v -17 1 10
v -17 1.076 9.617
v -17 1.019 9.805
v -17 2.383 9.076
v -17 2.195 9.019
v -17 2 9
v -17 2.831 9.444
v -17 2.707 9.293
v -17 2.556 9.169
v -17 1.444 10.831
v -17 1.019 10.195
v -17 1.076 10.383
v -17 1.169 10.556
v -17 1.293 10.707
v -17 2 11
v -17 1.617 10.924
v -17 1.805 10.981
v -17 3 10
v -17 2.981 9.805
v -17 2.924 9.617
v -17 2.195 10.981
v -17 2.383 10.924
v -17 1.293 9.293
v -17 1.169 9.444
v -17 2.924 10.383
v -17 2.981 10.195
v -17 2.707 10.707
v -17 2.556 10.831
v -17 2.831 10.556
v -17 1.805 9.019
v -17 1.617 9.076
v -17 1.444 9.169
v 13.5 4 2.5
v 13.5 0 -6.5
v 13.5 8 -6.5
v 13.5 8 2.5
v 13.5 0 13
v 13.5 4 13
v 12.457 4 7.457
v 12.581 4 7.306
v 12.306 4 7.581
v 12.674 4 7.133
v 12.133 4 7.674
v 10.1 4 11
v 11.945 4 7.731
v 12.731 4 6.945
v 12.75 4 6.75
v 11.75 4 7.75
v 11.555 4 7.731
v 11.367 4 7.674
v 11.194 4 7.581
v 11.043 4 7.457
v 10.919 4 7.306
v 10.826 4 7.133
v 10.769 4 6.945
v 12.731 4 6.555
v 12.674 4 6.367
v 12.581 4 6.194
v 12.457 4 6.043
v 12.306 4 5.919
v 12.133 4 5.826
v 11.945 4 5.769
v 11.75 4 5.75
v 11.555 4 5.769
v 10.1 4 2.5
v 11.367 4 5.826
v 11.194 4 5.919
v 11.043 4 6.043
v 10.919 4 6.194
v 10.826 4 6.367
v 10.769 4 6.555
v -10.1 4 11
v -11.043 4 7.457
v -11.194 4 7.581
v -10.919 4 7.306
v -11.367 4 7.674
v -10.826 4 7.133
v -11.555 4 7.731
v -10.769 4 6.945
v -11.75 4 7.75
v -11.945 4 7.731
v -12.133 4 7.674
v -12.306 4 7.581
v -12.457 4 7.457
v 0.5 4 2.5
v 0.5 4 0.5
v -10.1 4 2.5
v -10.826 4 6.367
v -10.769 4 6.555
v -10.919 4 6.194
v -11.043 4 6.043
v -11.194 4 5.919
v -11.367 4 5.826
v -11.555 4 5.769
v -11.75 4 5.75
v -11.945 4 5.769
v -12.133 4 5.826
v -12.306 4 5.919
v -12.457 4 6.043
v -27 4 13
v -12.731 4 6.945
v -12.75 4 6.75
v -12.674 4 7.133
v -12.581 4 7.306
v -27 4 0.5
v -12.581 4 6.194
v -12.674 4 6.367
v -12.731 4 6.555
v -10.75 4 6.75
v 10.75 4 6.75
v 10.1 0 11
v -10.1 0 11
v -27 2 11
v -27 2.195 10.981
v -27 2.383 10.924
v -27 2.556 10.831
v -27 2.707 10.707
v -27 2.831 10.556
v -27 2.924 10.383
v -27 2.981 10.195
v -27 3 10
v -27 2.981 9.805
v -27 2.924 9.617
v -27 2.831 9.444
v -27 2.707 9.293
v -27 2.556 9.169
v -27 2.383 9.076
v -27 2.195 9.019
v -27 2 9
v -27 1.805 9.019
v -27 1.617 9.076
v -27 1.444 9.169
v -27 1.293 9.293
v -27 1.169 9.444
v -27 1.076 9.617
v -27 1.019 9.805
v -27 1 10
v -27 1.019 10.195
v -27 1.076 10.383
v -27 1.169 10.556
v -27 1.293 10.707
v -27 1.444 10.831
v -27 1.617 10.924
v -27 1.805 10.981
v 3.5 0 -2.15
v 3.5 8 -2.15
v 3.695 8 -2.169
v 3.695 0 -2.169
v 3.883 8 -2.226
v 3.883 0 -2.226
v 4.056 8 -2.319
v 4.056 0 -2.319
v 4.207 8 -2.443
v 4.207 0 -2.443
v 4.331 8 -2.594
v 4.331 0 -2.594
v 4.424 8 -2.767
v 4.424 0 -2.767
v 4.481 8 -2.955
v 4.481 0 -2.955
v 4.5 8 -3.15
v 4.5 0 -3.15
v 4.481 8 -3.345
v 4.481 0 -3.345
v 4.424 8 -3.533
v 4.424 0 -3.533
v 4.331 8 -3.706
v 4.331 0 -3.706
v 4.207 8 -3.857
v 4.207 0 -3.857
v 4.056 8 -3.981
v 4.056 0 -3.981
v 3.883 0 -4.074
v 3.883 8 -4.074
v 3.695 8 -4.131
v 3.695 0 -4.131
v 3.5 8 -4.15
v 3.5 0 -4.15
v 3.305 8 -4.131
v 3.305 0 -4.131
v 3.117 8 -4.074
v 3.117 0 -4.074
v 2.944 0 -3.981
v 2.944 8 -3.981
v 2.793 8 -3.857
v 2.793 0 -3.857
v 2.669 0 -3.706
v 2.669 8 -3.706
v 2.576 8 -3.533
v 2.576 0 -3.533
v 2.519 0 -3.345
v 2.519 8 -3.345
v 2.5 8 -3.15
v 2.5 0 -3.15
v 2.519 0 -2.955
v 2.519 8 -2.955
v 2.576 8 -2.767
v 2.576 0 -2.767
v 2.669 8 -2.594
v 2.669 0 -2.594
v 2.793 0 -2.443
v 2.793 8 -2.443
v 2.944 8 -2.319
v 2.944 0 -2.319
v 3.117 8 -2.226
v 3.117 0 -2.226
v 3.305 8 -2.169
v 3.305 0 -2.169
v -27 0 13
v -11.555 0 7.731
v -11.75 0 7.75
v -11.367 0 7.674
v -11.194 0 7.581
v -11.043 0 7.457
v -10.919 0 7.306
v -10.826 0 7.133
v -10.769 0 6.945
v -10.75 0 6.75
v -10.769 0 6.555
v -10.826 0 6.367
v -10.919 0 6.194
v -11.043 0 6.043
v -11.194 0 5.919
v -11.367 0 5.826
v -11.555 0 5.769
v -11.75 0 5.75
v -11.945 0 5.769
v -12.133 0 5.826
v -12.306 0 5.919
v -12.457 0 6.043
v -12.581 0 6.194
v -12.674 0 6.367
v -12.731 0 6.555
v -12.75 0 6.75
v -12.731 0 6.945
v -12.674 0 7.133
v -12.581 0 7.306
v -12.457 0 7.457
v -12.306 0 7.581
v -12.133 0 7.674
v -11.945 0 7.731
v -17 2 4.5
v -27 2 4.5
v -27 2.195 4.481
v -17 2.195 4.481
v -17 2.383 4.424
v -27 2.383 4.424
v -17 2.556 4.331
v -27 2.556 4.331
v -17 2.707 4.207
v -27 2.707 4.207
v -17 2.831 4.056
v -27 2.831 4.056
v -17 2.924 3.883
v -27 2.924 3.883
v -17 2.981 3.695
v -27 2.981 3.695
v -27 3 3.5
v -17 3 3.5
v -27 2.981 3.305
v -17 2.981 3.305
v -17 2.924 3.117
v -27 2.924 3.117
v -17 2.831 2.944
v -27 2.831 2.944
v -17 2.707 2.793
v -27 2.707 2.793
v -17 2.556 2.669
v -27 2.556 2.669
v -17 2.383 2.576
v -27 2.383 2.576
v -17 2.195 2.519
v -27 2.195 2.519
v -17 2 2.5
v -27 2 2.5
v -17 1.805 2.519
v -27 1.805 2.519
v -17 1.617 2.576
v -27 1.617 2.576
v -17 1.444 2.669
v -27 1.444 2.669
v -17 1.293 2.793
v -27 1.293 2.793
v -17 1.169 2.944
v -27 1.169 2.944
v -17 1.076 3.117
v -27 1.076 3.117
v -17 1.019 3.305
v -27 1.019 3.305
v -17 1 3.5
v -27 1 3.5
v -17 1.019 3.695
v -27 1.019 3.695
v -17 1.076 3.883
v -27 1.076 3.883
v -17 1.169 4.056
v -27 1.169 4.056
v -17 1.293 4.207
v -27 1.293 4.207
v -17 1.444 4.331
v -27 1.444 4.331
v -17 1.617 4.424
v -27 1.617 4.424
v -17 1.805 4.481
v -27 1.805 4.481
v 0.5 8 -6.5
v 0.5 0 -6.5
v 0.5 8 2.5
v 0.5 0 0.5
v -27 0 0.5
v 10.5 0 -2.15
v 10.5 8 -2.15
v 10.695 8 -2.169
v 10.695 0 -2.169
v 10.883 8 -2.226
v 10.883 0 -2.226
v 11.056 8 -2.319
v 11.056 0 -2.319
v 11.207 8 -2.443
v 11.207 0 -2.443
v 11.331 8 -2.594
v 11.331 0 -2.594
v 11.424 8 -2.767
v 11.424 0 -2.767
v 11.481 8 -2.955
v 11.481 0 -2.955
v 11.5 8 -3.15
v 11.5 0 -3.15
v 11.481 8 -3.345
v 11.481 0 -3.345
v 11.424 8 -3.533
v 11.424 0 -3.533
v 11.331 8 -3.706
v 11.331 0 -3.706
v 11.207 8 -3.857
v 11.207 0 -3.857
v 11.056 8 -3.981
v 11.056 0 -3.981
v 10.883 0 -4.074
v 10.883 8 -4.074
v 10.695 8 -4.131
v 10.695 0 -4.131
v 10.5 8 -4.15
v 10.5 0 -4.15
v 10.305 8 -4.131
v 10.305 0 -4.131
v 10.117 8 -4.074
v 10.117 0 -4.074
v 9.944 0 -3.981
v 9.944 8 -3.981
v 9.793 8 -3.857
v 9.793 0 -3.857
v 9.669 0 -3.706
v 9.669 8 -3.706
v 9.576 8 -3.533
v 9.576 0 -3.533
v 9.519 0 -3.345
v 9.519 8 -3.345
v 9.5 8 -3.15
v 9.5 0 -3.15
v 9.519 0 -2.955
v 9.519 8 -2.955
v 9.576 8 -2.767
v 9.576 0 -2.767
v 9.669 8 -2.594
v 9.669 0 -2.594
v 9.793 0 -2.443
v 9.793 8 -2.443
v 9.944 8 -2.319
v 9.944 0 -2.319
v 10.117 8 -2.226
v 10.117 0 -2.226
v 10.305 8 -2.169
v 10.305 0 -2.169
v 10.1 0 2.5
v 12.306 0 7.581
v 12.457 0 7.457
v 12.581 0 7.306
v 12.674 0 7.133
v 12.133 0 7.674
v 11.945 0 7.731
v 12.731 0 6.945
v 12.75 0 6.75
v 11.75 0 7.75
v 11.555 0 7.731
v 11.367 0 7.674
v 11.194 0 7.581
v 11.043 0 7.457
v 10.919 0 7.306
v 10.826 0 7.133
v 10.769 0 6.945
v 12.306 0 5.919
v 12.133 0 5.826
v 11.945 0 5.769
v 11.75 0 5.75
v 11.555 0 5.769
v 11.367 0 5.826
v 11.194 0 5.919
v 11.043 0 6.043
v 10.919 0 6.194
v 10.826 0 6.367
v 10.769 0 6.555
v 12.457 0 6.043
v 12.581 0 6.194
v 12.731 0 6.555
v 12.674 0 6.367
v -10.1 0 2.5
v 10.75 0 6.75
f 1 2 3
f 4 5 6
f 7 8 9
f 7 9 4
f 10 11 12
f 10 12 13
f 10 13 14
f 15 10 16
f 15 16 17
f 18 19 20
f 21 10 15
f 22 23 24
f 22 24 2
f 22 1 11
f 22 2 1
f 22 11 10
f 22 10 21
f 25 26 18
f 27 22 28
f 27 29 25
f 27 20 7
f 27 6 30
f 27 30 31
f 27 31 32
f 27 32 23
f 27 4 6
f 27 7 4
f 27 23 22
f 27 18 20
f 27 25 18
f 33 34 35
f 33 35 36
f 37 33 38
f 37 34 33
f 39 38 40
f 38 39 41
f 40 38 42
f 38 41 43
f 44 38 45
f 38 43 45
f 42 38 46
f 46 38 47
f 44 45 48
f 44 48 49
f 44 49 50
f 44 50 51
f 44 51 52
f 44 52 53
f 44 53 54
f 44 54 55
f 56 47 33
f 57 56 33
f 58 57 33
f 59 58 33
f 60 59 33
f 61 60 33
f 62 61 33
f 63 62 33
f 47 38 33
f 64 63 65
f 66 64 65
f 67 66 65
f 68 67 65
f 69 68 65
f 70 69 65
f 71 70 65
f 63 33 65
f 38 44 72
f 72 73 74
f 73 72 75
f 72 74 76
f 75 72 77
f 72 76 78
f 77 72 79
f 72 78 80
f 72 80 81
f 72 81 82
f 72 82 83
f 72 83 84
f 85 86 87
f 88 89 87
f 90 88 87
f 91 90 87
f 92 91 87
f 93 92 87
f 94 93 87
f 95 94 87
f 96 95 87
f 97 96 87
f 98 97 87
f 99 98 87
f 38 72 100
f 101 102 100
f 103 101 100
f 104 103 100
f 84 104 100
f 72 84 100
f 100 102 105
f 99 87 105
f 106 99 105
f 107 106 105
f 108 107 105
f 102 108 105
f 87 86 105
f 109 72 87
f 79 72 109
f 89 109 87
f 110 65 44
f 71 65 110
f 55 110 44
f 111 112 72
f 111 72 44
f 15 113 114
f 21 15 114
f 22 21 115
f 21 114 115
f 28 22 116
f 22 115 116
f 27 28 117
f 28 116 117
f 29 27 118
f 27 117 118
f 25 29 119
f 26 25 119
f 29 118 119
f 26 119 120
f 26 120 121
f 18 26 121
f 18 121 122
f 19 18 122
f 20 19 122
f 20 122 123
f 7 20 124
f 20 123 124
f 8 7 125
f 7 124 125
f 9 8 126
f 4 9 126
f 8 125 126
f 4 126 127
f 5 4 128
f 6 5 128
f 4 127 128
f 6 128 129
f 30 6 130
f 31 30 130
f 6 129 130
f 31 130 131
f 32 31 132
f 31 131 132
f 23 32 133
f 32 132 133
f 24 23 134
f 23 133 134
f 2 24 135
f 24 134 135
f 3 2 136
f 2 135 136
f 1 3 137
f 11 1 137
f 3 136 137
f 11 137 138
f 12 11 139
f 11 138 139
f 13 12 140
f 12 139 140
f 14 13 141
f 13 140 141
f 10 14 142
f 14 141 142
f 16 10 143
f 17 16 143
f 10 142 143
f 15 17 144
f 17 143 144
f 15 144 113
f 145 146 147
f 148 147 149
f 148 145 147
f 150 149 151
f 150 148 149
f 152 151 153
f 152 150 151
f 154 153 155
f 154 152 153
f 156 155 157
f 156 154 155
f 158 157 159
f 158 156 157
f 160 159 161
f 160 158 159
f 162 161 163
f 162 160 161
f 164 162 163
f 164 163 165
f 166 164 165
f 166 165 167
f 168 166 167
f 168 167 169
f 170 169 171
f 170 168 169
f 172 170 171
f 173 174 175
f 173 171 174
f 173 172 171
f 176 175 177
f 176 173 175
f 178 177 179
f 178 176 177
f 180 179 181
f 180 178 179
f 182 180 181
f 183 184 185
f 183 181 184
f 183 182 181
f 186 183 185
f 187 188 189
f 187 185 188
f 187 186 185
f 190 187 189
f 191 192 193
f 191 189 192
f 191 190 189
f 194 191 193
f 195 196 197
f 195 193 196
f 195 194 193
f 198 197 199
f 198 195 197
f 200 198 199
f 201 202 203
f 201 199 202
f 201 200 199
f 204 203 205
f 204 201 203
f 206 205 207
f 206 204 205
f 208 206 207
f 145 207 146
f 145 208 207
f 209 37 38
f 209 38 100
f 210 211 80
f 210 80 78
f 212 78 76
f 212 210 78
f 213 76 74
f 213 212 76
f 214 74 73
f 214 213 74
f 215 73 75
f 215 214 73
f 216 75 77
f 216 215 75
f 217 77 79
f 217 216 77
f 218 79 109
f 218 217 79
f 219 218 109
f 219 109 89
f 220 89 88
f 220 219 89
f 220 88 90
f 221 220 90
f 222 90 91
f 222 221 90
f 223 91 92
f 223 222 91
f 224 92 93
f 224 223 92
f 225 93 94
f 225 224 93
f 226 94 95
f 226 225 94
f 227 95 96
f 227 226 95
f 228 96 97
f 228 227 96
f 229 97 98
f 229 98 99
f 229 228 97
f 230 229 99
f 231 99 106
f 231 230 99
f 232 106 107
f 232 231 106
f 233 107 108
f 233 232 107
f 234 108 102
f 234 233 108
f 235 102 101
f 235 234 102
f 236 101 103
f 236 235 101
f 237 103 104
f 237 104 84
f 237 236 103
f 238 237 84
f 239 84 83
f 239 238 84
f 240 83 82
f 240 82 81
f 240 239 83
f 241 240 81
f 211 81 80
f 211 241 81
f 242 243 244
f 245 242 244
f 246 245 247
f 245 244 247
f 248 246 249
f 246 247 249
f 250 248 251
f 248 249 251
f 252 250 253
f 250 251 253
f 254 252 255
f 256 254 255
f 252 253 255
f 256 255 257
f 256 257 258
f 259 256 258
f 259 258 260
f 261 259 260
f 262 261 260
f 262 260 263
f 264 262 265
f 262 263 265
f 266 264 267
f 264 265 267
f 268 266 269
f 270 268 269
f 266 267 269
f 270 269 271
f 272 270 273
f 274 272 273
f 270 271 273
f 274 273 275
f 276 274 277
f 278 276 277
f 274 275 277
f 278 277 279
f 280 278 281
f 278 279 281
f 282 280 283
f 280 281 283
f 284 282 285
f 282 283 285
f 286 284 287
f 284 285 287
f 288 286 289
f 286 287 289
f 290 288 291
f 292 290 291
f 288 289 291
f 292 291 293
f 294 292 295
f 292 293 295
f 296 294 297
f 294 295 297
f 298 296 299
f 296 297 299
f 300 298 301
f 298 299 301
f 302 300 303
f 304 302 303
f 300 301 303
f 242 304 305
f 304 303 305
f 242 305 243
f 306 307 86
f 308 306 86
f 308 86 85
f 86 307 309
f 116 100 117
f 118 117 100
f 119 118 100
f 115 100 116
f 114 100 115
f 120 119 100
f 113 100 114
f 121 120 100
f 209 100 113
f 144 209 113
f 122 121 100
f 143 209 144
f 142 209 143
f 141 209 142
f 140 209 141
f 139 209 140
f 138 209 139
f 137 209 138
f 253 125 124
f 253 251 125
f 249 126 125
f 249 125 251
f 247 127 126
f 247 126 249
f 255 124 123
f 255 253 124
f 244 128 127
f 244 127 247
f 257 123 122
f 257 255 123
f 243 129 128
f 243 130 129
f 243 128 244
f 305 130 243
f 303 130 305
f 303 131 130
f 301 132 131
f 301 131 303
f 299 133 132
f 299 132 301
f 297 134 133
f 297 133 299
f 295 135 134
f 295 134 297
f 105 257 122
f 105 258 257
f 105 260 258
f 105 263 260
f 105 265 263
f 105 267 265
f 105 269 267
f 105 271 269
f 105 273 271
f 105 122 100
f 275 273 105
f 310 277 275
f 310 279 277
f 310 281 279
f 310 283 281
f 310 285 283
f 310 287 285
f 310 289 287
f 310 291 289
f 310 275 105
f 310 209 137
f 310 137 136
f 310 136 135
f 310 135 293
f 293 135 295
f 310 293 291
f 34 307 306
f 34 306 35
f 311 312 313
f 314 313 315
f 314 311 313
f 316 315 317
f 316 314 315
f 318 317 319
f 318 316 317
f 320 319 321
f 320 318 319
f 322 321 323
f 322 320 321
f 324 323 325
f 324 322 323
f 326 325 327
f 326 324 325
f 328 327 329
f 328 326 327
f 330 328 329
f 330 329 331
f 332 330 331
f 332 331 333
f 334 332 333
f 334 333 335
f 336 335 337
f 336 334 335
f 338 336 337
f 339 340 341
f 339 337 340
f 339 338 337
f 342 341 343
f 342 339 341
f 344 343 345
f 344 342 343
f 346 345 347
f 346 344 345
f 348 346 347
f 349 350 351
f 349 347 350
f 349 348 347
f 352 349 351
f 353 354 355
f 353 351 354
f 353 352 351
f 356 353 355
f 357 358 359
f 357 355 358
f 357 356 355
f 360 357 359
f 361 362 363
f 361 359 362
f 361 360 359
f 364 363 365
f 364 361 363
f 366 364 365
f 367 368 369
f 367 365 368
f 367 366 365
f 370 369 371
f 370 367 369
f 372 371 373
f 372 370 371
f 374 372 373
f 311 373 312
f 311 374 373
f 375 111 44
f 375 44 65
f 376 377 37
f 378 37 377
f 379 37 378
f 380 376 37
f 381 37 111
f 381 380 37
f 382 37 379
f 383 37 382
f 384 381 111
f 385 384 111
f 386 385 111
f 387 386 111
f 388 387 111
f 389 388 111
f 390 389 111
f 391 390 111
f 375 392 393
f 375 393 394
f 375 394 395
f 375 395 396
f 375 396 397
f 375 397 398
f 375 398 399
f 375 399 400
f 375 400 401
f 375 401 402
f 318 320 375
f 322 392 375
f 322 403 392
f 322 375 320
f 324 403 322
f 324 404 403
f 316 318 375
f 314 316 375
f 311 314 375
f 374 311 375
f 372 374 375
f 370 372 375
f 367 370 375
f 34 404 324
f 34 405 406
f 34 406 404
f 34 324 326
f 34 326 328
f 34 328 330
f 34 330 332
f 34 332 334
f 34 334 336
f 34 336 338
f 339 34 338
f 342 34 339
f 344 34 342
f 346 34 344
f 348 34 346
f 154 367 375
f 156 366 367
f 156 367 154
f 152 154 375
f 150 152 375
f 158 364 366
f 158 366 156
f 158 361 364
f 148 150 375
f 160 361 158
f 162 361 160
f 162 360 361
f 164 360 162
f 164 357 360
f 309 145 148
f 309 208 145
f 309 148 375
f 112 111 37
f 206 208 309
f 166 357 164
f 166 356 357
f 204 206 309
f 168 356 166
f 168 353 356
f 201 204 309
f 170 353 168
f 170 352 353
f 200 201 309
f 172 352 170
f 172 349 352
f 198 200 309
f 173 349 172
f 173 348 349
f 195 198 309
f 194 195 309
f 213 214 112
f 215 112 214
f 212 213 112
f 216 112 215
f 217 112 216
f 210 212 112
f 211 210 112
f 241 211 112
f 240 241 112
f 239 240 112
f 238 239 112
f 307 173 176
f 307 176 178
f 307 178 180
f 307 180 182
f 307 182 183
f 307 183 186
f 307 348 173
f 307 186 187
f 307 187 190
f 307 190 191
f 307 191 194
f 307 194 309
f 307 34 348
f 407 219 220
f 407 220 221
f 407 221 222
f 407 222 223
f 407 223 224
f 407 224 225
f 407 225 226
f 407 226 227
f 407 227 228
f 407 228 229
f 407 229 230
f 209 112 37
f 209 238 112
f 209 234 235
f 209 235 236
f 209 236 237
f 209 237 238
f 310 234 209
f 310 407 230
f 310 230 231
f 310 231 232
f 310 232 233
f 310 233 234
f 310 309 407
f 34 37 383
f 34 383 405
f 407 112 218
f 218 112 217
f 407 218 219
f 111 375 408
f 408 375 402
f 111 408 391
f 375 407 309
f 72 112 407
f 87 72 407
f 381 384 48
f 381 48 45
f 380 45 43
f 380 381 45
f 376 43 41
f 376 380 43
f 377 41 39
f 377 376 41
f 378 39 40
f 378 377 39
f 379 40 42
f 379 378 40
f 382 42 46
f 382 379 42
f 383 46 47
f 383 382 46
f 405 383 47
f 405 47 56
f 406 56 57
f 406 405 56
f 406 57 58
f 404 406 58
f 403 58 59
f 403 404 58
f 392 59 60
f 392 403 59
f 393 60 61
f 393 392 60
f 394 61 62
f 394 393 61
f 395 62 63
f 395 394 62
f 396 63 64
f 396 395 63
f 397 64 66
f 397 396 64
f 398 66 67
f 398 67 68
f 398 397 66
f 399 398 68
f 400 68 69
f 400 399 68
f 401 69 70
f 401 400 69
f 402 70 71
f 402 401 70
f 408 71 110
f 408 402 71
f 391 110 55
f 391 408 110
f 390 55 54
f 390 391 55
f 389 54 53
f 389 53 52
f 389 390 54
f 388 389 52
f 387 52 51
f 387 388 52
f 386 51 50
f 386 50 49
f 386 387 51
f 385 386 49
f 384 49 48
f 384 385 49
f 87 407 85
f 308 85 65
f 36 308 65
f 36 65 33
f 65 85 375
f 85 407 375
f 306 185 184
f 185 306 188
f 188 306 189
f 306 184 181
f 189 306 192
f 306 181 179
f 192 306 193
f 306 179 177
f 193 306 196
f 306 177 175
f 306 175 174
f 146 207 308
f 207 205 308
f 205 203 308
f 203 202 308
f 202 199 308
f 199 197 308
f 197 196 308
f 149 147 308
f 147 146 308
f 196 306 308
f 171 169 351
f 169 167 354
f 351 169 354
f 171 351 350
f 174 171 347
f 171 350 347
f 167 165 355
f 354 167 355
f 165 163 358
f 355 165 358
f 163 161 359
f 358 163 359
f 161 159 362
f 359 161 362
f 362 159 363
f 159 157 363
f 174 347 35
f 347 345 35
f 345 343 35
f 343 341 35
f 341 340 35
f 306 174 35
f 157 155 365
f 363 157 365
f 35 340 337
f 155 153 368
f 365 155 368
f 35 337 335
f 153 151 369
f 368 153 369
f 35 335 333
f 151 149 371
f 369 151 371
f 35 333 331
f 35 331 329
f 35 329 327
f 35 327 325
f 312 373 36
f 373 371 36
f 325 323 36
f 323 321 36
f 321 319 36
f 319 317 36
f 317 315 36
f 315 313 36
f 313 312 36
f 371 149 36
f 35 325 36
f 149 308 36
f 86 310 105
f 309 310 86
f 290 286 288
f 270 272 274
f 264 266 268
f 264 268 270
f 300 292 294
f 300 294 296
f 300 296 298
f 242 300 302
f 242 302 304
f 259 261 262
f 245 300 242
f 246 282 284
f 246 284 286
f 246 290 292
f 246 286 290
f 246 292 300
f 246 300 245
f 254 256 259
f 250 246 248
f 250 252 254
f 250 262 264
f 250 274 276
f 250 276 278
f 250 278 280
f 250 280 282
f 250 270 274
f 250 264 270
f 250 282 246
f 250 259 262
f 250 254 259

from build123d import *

# Parameters (mm, degrees)
SZKIC1_R                    = 1
SZKIC1_W                    = 20.2
SZKIC1_H                    = 8.5
DODANIE_WYCI_GNI_CIE2_DEPTH = 4
SZKIC3_W                    = 13
SZKIC3_H                    = 9
DODANIE_WYCI_GNI_CIE3_DEPTH = 4
SZKIC1_3_R                  = 1
WYTNIJ_WYCI_GNI_CIE2_DEPTH  = 32.016124839
SZKIC4_R                    = 1
WYTNIJ_WYCI_GNI_CIE3_DEPTH  = 10


with BuildPart() as part:
    # Szkic1 → Dodanie-wyciągnięcie2 (new body)
    with BuildSketch(Plane(origin=(0, 0, 0), x_dir=(1, 0, 0), z_dir=(0, 1, 0))):
        Polygon((-27, -0.5), (0.5, -0.5), (0.5, 6.5), (13.5, 6.5), (13.5, -13), (-27, -13), align=None)
        with Locations((11.75, -6.75)):
            Circle(SZKIC1_R, mode=Mode.SUBTRACT)
        with Locations((-11.75, -6.75)):
            Circle(SZKIC1_R, mode=Mode.SUBTRACT)
        with Locations((3.5, 3.15)):
            Circle(SZKIC1_R, mode=Mode.SUBTRACT)
        with Locations((10.5, 3.15)):
            Circle(SZKIC1_R, mode=Mode.SUBTRACT)
        with Locations((0, -6.75)):
            Rectangle(SZKIC1_W, SZKIC1_H, mode=Mode.SUBTRACT)
    extrude(amount=DODANIE_WYCI_GNI_CIE2_DEPTH)

    # Szkic3 → Dodanie-wyciągnięcie3 (add)
    with BuildSketch(Plane.XZ.offset(-4)):
        with Locations((7, -2)):
            Rectangle(SZKIC3_W, SZKIC3_H)
    extrude(amount=-DODANIE_WYCI_GNI_CIE3_DEPTH)

    # Szkic1<3> → Wytnij-wyciągnięcie2 (cut, through all)
    with BuildSketch(Plane(origin=(0, 0, 0), x_dir=(1, 0, 0), z_dir=(0, 1, 0))):
        with Locations((3.5, 3.15)):
            Circle(SZKIC1_3_R)
        with Locations((10.5, 3.15)):
            Circle(SZKIC1_3_R)
    extrude(amount=WYTNIJ_WYCI_GNI_CIE2_DEPTH, mode=Mode.SUBTRACT)

    # Szkic4 → Wytnij-wyciągnięcie3 (cut)
    with BuildSketch(Plane.ZY.offset(27)):
        with Locations((3.5, 2)):
            Circle(SZKIC4_R)
        with Locations((10, 2)):
            Circle(SZKIC4_R)
    extrude(amount=-WYTNIJ_WYCI_GNI_CIE3_DEPTH, mode=Mode.SUBTRACT)


solid = part.part
